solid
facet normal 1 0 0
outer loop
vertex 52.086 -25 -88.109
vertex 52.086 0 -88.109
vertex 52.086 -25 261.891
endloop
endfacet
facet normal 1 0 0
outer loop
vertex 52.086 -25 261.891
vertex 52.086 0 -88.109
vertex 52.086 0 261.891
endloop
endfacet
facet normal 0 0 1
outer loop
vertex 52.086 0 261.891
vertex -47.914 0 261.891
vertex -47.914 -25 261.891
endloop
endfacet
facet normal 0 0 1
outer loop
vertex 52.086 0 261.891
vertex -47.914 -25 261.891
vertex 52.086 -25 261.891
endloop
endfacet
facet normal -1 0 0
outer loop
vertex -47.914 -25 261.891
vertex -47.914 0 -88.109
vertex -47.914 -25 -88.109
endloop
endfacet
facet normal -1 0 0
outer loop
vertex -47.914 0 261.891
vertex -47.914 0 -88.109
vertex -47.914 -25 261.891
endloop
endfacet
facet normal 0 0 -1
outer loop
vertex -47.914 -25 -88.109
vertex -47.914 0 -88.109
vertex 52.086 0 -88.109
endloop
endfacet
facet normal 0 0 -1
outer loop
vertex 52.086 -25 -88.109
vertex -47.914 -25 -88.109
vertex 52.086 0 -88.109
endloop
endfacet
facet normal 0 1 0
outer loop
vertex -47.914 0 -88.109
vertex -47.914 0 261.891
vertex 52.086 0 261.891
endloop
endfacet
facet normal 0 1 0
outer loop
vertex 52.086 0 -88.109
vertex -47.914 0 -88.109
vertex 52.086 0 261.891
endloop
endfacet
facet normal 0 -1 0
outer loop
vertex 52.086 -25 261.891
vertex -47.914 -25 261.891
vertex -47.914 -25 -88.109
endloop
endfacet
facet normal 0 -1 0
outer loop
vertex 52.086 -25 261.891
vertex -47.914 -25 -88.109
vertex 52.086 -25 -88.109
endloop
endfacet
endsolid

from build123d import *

# Parameters (mm, degrees)
F0_W     = 100
F0_H     = 350
F1_DEPTH = 25
F2_DEPTH = 25
F3_DEPTH = 25


with BuildPart() as f1:
    # F0 (on Front) → F1 (new body)
    with BuildSketch(Plane.XZ):
        with Locations((2.086393, 86.891304)):
            Rectangle(F0_W, F0_H)
    extrude(amount=F1_DEPTH)

    # F0 (on Front) → F2 (join)
    with BuildSketch(Plane.XZ):
        with Locations((2.086393, 86.891304)):
            Rectangle(F0_W, F0_H)
    extrude(amount=F2_DEPTH)

    # F0 (on Front) → F3 (join)
    with BuildSketch(Plane.XZ):
        with Locations((2.086393, 86.891304)):
            Rectangle(F0_W, F0_H)
    extrude(amount=F3_DEPTH)


solid = f1.part
